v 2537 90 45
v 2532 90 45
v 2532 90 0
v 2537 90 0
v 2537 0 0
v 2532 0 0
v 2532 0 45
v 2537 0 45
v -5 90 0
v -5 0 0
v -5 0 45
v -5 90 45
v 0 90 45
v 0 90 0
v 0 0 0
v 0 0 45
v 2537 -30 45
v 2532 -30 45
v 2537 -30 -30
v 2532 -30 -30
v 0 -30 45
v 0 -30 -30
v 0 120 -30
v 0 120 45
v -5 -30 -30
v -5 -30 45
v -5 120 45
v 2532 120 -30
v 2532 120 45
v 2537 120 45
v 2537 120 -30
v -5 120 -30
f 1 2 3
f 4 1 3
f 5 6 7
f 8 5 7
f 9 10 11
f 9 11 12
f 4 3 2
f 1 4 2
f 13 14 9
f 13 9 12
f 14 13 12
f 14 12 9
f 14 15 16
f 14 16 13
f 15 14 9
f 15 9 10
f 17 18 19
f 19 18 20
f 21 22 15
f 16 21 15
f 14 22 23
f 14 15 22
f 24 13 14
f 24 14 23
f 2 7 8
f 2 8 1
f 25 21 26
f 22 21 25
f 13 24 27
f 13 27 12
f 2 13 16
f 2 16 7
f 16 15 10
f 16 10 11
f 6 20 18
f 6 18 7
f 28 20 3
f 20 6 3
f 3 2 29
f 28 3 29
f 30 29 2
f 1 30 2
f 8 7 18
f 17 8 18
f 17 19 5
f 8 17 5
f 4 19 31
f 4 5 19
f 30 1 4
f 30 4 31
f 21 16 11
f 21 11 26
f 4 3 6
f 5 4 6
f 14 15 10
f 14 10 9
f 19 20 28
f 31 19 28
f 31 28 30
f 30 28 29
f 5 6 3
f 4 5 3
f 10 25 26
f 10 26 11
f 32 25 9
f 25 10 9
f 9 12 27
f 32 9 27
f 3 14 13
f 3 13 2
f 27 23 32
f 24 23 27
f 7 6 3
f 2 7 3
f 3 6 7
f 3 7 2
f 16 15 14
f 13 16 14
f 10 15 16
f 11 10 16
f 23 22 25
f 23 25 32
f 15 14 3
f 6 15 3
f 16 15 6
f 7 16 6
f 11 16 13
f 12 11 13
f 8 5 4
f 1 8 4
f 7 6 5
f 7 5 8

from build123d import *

# Parameters (mm, degrees)
F0_W       = 2532
F0_H       = 90
F1_DEPTH   = 45
F1_FACE1_W = 90
F1_FACE1_H = 45
F3_DEPTH   = 5
F6_DEPTH   = 5
F7_DEPTH   = 5


with BuildPart() as f1:
    # F0 (on Top) → F1 (new body)
    with BuildSketch(Plane.XY):
        with Locations((1266, 45)):
            Rectangle(F0_W, F0_H)
    extrude(amount=F1_DEPTH)

    # F2 (on face) + F1_face1 (on face) → F3 (join)
    with BuildSketch(Plane.YZ.offset(2532)):
        Polygon((120, -30), (120, 45), (90, 45), (90, 0), (0, 0), (0, 45), (-30, 45), (-30, -30), align=None)
    with BuildSketch(Plane(origin=(0, 45, 22.5), x_dir=(0, -1, 0), z_dir=(-1, 0, 0))):
        Rectangle(F1_FACE1_W, F1_FACE1_H)
    extrude(amount=F3_DEPTH, dir=(1, 0, 0))

    # F5: F1 across plane


with BuildPart() as f1_1:
    add(f1.part)
    add(f1.part.mirror(Plane(origin=(1266, 45, 22.5), x_dir=(0, -1, 0), z_dir=(-1, 0, 0))))


with BuildPart() as f6:
    # F6 (new): a face of the model
    f6_faces = [f1_1.part.faces().sort_by_distance(p)[0] for p in [
        (0, 45, 22.5),
    ]]
    extrude(f6_faces, amount=F6_DEPTH)


with BuildPart() as f7:
    # F7 (new): a face of the model
    f7_faces = [f1_1.part.faces().sort_by_distance(p)[0] for p in [
        (2532, 45, 22.5),
    ]]
    extrude(f7_faces, amount=F7_DEPTH)


solid = Compound([f1_1.part, f6.part, f7.part])
